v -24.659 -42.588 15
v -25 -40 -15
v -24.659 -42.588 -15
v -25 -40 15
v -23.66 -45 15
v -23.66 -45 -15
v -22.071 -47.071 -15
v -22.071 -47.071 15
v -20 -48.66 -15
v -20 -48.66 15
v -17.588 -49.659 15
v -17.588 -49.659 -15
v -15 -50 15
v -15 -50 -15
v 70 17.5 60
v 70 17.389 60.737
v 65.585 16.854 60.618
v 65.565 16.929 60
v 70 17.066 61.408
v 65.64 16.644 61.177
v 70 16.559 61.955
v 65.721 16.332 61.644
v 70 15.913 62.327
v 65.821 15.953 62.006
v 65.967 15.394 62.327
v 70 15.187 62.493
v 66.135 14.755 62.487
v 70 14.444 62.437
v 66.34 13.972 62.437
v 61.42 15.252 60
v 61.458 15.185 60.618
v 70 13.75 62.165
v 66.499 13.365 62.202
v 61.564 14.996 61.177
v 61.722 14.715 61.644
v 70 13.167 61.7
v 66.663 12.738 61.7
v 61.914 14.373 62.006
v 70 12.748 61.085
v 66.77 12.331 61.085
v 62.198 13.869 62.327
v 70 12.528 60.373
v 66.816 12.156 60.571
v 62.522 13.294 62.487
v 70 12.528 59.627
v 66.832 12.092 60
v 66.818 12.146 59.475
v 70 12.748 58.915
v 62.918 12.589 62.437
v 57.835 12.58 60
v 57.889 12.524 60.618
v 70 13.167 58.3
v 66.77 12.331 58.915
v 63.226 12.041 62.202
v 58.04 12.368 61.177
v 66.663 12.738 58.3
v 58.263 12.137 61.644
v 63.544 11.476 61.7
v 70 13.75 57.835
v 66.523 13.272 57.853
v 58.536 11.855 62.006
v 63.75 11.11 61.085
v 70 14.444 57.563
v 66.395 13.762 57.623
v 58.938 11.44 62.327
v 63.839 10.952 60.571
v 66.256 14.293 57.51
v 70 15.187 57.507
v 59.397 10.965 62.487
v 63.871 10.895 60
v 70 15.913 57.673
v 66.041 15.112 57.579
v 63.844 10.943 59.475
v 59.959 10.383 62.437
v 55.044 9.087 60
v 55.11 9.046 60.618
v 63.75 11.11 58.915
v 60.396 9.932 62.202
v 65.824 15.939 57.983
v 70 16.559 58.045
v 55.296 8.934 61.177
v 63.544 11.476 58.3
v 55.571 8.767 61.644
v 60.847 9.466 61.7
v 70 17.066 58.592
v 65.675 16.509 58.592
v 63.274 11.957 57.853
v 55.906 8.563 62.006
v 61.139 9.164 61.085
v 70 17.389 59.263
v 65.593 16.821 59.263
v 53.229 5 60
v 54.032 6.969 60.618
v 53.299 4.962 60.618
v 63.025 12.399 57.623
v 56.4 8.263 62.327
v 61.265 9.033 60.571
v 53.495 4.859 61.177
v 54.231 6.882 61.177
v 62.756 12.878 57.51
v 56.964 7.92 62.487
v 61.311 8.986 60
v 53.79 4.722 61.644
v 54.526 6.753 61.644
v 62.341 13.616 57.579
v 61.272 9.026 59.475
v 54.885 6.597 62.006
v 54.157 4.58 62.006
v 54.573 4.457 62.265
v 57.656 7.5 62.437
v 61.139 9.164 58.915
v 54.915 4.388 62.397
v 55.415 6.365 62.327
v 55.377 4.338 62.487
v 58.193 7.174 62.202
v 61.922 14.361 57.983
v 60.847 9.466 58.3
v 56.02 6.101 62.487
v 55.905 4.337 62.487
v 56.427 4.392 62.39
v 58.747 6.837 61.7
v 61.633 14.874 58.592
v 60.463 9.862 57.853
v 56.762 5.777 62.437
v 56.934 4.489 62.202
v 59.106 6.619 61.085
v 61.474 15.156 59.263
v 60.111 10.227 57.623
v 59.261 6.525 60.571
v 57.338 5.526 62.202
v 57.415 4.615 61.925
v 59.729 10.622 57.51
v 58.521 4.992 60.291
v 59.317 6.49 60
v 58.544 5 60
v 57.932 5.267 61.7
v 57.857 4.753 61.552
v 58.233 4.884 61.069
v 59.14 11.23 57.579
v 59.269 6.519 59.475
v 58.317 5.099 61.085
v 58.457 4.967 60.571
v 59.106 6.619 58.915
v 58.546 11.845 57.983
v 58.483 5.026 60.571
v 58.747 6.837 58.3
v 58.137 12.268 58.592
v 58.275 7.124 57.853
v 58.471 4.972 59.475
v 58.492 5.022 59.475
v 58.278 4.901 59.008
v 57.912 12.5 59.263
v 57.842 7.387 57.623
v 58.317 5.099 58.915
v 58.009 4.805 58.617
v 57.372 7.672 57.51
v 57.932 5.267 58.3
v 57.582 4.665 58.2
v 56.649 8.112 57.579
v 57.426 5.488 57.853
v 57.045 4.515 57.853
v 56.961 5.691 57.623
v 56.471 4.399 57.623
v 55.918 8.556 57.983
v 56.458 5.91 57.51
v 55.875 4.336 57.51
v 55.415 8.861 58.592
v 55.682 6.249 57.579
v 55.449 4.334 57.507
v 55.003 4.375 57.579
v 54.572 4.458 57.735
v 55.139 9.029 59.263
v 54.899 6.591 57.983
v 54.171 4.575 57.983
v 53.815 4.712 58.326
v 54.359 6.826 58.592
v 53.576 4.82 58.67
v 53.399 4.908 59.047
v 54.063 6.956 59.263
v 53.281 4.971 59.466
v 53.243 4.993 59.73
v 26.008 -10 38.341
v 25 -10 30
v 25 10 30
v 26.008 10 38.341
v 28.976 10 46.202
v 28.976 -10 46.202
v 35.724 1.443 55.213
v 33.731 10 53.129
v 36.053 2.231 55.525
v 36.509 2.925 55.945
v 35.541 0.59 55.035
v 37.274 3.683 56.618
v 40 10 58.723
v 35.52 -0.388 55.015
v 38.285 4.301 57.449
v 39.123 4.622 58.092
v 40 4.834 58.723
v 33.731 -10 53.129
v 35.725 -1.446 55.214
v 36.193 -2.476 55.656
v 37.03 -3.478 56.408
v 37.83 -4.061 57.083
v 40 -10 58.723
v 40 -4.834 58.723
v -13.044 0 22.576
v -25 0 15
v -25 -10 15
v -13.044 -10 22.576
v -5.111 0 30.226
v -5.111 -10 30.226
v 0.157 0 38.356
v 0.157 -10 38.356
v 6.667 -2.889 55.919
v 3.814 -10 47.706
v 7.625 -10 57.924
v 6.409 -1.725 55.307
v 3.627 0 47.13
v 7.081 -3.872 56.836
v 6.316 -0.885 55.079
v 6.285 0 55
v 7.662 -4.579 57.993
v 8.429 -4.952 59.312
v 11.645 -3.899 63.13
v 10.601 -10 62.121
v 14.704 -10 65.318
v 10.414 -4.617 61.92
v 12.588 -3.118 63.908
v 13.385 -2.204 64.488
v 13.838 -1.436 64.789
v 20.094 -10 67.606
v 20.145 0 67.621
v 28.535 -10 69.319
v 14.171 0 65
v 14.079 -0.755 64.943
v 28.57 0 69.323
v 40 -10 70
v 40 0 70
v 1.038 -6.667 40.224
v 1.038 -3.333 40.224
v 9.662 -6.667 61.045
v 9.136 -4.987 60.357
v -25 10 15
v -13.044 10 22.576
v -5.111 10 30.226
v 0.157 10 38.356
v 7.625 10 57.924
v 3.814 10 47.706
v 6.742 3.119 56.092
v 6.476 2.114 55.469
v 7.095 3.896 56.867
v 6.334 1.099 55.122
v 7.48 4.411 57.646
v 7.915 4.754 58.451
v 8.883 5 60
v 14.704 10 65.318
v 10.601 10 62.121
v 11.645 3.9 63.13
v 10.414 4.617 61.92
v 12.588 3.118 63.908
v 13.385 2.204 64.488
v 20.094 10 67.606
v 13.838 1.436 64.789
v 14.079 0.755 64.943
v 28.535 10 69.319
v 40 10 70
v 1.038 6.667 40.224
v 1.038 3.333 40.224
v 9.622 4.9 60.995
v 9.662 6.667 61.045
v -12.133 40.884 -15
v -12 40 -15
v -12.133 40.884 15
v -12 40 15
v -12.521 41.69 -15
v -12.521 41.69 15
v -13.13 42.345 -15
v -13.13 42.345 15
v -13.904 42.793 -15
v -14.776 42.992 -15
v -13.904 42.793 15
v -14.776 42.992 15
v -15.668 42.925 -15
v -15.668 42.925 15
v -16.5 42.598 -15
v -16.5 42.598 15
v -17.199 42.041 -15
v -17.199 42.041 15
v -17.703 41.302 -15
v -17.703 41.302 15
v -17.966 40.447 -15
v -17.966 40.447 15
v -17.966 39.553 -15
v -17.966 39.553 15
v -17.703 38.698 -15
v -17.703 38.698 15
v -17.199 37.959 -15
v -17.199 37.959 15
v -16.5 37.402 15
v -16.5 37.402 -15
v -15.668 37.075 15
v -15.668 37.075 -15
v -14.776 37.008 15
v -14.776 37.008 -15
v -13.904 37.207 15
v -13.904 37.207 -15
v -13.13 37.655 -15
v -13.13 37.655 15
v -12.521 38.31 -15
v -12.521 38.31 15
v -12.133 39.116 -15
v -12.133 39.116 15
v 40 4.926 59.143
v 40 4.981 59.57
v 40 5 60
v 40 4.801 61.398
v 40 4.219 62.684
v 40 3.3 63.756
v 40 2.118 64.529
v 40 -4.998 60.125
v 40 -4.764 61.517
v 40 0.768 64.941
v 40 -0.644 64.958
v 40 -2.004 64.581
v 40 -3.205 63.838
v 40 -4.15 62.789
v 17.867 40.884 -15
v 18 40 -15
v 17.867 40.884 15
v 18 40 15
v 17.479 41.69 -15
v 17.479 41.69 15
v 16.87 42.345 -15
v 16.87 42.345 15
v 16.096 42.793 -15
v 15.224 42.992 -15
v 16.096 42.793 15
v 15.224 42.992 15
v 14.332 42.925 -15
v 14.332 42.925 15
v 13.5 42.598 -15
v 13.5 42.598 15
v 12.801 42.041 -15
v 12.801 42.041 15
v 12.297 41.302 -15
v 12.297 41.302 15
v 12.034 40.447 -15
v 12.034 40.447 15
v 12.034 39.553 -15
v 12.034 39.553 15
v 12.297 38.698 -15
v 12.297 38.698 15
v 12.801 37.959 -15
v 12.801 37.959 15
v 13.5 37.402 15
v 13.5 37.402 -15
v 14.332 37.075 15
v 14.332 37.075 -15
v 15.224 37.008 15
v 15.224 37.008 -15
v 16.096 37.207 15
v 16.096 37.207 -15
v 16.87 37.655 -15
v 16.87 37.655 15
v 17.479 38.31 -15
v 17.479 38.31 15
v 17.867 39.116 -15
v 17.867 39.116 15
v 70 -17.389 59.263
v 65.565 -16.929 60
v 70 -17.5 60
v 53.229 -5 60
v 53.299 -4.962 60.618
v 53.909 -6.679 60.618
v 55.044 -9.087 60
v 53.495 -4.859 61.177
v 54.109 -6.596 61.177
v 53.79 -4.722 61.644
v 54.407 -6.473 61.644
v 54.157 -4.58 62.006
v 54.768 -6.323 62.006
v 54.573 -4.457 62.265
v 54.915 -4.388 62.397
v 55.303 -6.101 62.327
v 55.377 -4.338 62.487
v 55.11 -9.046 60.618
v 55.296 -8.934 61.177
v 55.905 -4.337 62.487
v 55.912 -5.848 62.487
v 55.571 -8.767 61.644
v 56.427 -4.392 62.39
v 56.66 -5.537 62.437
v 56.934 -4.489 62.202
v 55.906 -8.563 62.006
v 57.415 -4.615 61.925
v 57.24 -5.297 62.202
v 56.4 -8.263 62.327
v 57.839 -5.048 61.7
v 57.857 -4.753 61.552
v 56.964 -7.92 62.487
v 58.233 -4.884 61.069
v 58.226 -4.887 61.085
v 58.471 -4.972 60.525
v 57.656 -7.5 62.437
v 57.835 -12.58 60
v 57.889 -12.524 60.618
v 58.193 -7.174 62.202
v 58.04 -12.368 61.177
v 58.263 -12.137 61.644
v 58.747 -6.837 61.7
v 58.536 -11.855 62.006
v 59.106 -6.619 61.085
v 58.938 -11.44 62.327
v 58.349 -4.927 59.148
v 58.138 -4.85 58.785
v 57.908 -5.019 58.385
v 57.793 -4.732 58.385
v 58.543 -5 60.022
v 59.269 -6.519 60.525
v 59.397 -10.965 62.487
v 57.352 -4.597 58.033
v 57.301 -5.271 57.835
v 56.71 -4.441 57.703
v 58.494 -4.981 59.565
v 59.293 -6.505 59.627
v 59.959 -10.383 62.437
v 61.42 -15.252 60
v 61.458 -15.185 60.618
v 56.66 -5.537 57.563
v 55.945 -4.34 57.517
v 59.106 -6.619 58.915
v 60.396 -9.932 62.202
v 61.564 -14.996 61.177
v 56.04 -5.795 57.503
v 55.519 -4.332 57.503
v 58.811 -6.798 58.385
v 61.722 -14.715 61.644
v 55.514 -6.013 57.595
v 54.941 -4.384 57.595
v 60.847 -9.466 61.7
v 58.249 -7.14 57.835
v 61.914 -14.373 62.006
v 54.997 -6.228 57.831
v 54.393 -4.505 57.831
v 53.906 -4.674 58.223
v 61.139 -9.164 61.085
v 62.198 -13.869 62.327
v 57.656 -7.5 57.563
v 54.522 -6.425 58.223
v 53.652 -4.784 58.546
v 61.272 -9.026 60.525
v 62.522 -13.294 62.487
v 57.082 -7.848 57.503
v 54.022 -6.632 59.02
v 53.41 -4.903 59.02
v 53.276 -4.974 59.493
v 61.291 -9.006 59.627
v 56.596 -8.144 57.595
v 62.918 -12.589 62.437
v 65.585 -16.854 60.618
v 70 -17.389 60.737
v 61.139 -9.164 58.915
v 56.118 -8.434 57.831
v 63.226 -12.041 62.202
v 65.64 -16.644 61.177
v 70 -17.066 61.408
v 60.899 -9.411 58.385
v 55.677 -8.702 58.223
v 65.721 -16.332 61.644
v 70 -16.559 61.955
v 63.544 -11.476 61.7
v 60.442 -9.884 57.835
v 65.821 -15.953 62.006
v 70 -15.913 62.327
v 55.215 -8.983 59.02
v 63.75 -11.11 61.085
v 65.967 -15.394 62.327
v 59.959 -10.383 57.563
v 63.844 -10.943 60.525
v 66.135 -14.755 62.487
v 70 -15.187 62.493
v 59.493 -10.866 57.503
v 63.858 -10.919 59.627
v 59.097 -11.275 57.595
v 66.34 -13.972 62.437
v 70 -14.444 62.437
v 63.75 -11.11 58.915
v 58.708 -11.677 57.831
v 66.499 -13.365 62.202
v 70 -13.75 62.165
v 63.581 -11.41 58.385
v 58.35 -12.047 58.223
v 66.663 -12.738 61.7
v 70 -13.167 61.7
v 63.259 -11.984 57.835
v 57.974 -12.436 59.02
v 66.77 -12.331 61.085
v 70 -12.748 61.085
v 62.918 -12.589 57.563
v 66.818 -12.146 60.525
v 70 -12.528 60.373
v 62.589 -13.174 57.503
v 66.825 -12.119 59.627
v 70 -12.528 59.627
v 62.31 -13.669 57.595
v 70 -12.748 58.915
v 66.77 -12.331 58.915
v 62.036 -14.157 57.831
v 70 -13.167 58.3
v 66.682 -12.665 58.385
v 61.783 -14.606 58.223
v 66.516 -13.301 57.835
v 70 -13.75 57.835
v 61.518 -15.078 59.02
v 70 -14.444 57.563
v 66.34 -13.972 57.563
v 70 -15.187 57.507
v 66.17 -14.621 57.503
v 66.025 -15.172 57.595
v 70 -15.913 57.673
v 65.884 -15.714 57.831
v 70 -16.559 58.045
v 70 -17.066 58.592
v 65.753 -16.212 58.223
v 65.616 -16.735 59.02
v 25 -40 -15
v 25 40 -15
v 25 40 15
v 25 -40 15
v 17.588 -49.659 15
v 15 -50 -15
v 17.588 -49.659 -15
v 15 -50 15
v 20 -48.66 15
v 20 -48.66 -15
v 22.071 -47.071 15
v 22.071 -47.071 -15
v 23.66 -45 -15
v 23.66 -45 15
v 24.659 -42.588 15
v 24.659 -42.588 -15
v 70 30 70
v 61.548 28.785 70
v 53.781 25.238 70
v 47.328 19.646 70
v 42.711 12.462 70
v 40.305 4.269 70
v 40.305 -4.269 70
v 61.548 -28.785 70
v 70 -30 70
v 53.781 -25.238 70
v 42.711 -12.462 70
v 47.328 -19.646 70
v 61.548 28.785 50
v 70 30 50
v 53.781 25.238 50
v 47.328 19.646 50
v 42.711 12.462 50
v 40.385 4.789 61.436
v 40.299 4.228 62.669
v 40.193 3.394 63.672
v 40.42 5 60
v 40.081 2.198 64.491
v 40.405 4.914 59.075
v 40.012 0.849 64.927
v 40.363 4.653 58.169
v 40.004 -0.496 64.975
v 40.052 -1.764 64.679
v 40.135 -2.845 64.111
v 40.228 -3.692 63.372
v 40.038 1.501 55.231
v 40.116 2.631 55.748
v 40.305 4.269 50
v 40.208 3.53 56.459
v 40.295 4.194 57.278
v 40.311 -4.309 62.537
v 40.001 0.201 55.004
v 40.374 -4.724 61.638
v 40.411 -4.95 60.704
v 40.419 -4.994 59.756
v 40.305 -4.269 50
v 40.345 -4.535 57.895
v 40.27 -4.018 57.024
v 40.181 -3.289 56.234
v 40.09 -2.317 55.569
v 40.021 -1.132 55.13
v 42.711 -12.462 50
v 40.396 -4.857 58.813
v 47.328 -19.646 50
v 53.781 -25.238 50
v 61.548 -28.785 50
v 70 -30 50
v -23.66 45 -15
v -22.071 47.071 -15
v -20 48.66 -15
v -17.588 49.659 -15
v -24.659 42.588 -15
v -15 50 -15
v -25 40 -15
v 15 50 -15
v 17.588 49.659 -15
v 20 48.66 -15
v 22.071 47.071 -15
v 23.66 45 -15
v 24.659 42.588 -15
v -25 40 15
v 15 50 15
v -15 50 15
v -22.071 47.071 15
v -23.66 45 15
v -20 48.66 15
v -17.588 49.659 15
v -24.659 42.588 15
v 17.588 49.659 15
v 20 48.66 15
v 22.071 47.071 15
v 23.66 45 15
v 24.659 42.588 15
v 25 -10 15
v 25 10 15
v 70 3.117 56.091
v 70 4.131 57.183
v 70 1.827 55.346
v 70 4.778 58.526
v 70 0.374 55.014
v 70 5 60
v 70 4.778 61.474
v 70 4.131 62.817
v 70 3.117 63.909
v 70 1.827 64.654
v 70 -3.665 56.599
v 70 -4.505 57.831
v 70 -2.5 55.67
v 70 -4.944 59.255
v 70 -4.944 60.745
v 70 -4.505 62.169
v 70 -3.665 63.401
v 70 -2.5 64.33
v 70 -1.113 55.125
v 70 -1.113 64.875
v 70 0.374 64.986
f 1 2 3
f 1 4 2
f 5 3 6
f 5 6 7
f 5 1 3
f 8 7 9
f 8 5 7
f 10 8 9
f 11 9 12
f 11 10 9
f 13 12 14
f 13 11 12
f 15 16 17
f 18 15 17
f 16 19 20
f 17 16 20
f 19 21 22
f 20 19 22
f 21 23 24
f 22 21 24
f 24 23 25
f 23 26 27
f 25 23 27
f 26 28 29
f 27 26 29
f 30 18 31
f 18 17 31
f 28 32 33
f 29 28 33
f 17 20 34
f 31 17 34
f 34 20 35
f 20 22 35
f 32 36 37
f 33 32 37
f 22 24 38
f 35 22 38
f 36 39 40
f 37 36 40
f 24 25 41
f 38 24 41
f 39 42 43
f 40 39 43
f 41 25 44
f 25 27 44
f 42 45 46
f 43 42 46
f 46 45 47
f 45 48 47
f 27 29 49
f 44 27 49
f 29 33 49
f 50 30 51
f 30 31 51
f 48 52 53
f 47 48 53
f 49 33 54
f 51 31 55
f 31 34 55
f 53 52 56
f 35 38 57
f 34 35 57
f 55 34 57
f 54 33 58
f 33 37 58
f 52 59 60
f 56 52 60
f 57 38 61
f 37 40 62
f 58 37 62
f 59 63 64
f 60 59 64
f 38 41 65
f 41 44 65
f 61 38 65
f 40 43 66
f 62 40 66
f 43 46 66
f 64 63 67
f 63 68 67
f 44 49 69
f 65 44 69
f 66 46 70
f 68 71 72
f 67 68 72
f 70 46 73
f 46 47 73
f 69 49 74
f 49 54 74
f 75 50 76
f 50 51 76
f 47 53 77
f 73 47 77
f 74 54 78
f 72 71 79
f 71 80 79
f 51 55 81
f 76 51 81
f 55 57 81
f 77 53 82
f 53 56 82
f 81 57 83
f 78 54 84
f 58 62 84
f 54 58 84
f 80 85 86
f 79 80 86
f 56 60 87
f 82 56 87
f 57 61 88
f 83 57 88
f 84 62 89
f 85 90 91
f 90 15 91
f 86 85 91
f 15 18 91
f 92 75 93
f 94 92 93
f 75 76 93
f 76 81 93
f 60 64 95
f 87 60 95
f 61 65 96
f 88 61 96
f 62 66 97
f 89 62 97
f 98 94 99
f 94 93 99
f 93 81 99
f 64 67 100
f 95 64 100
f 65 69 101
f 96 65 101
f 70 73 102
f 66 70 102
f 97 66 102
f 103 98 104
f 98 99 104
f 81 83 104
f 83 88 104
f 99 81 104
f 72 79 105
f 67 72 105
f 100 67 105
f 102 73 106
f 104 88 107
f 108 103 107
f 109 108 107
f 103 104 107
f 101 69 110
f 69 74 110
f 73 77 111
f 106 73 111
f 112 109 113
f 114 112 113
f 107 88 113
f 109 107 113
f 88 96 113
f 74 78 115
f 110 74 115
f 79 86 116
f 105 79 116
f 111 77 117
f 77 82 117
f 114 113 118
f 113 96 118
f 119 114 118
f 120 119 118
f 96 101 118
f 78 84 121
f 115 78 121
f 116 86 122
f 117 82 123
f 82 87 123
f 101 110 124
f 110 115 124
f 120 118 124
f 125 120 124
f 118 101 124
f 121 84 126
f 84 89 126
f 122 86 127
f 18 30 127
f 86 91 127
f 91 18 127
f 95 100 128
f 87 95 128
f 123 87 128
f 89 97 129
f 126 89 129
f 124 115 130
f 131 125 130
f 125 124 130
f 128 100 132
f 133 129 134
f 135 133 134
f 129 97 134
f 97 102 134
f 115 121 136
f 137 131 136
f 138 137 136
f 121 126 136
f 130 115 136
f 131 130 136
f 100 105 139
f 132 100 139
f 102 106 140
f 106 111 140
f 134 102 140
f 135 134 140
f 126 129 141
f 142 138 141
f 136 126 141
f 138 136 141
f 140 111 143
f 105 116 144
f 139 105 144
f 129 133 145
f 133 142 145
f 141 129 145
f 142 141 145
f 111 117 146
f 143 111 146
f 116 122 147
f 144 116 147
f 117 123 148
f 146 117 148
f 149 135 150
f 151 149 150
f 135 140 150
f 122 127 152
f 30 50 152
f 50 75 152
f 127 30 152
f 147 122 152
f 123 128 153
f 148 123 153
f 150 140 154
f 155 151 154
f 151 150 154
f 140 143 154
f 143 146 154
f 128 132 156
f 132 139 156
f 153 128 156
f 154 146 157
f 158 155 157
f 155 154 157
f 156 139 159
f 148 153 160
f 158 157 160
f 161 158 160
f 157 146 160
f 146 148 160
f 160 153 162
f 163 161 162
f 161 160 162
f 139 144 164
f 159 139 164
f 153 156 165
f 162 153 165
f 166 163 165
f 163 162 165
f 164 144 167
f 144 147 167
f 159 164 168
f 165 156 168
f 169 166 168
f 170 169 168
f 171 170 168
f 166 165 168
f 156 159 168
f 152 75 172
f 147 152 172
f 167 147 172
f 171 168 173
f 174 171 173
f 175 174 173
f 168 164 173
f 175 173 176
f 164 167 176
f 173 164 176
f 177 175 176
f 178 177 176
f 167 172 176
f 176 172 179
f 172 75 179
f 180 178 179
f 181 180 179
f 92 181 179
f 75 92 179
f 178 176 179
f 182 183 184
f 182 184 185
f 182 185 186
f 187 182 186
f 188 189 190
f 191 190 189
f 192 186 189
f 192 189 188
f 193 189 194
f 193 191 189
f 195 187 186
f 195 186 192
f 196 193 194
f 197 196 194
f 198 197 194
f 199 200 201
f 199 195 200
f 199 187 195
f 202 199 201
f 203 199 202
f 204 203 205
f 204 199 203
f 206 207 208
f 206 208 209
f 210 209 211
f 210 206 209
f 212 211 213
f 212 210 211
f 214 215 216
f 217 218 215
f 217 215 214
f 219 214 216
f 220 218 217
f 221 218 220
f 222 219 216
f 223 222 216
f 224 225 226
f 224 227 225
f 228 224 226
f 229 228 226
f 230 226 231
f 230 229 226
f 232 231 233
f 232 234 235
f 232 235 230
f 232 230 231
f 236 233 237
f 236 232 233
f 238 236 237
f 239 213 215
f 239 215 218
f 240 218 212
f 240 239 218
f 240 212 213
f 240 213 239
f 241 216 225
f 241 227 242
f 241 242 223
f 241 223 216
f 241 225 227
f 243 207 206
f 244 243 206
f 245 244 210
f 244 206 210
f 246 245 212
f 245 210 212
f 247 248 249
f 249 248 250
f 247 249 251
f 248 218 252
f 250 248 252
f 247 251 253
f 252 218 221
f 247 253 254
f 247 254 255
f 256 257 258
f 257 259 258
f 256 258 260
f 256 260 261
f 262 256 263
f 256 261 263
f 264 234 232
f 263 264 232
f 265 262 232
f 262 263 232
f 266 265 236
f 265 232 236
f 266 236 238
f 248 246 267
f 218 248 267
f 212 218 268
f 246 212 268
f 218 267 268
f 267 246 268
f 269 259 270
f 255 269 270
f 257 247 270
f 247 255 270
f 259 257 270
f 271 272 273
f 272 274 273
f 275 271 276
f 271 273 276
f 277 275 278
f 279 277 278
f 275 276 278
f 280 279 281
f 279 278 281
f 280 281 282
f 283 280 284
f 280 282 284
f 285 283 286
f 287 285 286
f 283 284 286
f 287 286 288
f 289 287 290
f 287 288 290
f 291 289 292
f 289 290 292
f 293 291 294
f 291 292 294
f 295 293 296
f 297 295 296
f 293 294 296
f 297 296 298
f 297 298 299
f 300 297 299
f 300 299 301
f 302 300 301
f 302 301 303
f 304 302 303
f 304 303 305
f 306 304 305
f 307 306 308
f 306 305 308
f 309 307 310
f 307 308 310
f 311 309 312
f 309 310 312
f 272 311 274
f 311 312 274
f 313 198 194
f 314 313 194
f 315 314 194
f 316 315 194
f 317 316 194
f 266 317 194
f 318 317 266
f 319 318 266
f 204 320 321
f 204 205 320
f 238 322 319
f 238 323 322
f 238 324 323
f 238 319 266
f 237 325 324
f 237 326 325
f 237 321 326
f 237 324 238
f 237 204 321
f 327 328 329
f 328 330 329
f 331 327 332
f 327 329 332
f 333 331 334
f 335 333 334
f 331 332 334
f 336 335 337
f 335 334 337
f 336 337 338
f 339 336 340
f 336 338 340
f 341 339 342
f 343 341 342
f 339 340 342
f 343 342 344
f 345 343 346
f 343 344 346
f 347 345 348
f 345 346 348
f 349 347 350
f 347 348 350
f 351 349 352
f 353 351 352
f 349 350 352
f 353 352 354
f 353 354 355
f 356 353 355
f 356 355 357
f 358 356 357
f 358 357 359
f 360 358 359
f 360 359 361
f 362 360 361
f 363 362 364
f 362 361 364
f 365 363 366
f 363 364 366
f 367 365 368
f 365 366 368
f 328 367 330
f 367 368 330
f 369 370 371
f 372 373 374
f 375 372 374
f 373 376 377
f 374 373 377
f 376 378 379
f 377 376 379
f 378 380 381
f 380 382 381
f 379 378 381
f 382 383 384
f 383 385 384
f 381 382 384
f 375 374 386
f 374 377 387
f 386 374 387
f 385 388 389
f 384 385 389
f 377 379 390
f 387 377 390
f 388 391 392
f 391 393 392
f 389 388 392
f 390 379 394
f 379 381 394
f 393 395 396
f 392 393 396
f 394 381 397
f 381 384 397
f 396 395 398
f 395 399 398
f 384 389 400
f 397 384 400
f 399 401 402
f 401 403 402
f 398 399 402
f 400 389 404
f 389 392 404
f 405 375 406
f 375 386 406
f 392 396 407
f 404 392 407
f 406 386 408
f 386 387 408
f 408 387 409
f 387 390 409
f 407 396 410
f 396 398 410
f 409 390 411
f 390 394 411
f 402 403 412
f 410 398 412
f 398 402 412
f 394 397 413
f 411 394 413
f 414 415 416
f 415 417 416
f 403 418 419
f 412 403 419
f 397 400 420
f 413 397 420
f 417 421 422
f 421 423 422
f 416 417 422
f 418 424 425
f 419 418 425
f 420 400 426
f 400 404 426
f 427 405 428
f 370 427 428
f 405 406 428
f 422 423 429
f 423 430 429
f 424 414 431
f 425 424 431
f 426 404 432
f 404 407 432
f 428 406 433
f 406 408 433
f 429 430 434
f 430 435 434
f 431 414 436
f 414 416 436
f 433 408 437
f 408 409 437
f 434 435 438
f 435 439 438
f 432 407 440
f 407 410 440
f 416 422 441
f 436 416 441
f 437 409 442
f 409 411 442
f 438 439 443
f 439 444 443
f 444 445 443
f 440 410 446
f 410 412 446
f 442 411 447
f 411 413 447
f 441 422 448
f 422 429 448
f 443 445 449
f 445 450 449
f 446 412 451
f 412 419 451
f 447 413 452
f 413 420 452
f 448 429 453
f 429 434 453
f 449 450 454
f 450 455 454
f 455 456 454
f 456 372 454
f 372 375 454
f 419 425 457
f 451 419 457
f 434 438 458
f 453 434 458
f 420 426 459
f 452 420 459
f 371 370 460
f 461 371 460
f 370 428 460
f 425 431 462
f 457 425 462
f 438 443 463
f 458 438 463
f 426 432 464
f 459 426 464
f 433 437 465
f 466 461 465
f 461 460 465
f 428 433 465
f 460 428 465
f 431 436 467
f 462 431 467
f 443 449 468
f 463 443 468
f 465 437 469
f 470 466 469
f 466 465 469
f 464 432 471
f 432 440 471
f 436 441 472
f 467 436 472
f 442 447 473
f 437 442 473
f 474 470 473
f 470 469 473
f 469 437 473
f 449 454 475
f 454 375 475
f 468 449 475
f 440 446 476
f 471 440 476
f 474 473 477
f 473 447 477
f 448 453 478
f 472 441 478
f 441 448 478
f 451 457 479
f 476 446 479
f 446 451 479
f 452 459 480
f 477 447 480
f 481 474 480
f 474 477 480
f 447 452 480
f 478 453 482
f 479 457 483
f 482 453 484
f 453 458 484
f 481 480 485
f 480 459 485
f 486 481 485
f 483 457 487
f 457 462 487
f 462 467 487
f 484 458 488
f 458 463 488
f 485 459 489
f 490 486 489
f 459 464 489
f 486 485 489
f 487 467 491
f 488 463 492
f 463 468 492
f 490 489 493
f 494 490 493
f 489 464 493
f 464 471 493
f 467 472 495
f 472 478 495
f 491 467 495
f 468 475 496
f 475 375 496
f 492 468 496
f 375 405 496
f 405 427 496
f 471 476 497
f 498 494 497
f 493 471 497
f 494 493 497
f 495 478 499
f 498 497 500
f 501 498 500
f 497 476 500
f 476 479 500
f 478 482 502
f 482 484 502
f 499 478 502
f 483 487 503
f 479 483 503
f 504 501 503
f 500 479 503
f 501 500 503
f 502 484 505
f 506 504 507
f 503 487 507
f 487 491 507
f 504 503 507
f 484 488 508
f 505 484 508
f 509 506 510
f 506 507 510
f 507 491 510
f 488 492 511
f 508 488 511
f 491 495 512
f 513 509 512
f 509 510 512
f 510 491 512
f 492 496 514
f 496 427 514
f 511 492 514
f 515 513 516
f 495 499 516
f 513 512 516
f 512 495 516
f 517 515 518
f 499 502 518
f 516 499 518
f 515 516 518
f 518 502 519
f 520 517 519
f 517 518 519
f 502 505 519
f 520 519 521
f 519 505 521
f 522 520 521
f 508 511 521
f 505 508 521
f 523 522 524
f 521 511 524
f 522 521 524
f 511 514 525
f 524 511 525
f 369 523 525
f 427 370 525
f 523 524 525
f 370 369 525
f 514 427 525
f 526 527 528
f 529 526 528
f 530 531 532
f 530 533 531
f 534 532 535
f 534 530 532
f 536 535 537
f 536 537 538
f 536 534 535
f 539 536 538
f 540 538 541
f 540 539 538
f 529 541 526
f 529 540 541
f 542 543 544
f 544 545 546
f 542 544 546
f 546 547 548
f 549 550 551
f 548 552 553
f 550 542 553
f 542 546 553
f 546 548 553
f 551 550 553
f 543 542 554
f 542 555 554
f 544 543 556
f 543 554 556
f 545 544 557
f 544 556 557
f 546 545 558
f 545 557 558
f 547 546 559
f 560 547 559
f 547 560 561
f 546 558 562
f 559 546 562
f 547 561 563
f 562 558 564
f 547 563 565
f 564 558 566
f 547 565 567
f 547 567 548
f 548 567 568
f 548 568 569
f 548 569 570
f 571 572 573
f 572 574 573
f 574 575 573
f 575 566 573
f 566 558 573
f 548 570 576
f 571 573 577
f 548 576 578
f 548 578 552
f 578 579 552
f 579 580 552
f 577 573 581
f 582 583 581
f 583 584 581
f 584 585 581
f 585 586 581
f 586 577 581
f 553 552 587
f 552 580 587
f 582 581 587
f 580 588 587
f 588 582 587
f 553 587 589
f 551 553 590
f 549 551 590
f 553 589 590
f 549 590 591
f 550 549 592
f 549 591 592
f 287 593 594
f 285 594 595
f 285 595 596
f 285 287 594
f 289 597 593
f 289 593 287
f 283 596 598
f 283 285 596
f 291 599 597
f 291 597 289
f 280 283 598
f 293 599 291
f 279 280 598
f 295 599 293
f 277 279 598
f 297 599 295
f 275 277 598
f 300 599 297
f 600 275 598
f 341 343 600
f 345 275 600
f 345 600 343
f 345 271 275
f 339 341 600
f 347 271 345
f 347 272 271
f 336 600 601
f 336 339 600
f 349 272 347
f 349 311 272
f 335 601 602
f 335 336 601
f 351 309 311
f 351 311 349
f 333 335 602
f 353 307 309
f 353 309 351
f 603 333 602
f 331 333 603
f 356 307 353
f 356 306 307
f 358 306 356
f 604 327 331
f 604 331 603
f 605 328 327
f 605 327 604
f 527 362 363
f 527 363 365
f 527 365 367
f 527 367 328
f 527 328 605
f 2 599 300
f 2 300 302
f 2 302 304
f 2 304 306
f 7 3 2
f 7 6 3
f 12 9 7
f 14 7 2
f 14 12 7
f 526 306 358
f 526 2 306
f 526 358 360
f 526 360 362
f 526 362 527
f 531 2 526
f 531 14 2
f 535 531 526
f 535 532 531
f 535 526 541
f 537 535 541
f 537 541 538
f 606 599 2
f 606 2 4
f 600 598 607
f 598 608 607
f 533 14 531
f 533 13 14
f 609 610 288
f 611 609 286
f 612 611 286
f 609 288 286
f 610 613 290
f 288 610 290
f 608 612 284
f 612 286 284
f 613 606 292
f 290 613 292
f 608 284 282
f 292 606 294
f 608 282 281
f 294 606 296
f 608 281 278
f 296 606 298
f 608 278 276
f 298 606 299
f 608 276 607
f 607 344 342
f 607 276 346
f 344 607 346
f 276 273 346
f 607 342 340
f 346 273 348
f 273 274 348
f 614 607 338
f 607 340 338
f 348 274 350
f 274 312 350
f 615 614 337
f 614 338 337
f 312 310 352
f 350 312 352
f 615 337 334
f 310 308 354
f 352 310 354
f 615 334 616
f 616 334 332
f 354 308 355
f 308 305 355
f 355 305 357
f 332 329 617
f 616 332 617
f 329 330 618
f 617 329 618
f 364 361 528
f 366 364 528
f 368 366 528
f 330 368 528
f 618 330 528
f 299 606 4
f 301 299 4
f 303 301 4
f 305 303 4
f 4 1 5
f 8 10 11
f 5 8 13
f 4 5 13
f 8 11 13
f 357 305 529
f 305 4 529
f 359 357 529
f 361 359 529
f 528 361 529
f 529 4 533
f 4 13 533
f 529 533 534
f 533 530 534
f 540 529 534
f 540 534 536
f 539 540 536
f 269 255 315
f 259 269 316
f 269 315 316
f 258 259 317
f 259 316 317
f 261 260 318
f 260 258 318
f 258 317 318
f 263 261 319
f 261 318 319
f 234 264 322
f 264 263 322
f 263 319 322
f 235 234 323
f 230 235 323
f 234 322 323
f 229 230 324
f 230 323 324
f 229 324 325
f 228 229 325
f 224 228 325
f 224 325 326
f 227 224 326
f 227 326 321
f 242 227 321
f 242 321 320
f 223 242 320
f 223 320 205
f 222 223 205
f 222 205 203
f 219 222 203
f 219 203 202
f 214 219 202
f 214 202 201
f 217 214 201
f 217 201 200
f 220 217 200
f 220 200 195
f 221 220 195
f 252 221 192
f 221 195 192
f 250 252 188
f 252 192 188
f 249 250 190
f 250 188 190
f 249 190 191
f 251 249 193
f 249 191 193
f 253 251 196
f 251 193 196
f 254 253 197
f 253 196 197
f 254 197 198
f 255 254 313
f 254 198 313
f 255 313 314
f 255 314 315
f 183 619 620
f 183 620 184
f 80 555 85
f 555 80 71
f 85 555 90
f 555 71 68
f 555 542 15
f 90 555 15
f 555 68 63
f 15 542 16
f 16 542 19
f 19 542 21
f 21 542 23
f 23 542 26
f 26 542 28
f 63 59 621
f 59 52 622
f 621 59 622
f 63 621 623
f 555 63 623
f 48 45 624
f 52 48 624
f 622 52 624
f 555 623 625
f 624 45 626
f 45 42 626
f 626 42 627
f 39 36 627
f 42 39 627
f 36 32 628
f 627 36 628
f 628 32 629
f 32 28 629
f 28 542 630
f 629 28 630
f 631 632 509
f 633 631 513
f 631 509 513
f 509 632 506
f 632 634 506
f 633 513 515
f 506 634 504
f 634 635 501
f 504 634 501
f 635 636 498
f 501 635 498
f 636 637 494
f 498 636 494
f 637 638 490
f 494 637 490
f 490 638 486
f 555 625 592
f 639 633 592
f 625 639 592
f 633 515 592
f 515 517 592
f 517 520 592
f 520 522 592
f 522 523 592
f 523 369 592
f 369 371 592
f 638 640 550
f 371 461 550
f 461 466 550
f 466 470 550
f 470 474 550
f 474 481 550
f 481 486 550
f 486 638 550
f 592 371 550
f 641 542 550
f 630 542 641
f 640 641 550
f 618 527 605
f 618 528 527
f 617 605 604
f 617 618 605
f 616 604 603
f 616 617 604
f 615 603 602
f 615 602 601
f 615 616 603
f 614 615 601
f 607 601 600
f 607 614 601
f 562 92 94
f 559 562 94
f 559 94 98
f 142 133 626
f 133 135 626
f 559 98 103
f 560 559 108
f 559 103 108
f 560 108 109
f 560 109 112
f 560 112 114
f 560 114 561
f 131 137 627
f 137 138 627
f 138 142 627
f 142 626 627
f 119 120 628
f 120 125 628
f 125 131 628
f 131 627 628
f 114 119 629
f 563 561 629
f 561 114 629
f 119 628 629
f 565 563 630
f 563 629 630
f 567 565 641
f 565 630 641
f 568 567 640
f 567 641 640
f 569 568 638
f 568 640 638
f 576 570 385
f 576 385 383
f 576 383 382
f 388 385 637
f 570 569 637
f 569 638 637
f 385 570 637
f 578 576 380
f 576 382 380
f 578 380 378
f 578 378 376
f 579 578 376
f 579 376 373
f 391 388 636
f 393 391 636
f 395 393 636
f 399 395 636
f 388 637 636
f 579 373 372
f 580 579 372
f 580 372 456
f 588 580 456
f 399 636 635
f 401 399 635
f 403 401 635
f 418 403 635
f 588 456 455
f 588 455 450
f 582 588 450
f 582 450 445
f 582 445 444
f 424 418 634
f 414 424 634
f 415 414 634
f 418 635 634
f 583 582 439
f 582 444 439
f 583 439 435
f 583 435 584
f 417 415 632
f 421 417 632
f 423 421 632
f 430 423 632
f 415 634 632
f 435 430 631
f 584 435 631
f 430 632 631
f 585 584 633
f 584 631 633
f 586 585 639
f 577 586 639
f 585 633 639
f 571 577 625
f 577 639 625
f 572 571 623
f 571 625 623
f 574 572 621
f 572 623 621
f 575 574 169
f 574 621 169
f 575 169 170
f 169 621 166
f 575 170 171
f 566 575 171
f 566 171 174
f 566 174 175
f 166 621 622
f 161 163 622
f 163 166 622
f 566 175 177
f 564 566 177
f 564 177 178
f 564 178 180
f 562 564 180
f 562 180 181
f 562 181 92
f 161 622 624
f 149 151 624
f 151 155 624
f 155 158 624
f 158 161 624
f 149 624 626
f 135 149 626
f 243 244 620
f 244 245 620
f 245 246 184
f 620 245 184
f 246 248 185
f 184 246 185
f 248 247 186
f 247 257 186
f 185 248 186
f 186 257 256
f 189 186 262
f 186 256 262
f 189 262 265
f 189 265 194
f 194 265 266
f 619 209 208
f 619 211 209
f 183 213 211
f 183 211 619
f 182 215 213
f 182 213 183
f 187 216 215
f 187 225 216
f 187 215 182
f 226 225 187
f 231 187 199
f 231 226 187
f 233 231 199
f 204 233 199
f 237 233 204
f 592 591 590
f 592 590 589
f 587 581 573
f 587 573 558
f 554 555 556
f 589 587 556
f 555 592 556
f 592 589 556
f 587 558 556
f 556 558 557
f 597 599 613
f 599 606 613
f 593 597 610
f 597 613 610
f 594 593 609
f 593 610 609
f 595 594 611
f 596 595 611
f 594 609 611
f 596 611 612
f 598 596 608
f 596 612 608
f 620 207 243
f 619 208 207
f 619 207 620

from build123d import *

# Parameters (mm, degrees)
F0_W          = 50
F0_H          = 30
F1_DEPTH      = 50
F2_DEPTH      = 10
F3_ANGLE_BACK = 90
F3_ANGLE      = 180
F4_R          = 10
F5_R          = 3
F6_DEPTH      = 17.5
F7_DEPTH      = 15
F8_R          = 5
F9_DEPTH      = 100


with BuildPart() as f1:
    # F0 (on Front) → F1 (new body, symmetric)
    with BuildSketch(Plane.XZ):
        Rectangle(F0_W, F0_H)
    extrude(amount=F1_DEPTH, both=True)

    # F4
    f4_edges = [f1.edges().sort_by_distance(p)[0] for p in [
        (-25, -50, 0),
        (25, -50, 0),
        (25, 50, 0),
        (-25, 50, 0),
    ]]
    fillet(f4_edges, radius=F4_R)

    # F5 (on Top) → F6 (cut, symmetric)
    with BuildSketch(Plane.XY):
        with Locations((-15, 40)):
            Circle(F5_R)
    extrude(amount=F6_DEPTH, both=True, mode=Mode.SUBTRACT)

    # F5 (on Top) → F7 (cut, symmetric)
    with BuildSketch(Plane.XY):
        with Locations((15, 40)):
            Circle(F5_R)
    extrude(amount=F7_DEPTH, both=True, mode=Mode.SUBTRACT)


with BuildPart() as f2:
    # F0 (on Front) → F2 (new body, symmetric)
    with BuildSketch(Plane.XZ):
        with BuildLine():
            Line((-25, 15), (25, 15))
            Line((25, 15), (25, 30))
            ThreePointArc((25, 30), (28.975815885, 46.201851746), (40, 58.7228132327))
            Line((40, 58.7228132327), (40, 70))
            add(Edge.make_bspline(
                [(-25, 15), (22.7879397571, 39.9372093379), (-14.2387868837, 69.4658607244), (40, 70)],
                knots=[0, 0, 0, 0, 85.1469318296, 85.1469318296, 85.1469318296, 85.1469318296], degree=3))
        make_face()
    extrude(amount=F2_DEPTH, both=True)


with BuildPart() as f3:
    # F0 (on Front) → F3 (revolve)
    with BuildSketch(Plane.XZ, mode=Mode.PRIVATE) as f3_sk:
        Polygon((70, 70), (40, 70), (40, 58.7228132327), (40, 50), (70, 50), align=None)
        with BuildLine():
            ThreePointArc((57.5, 60), (55, 57.5), (52.5, 60))
            ThreePointArc((52.5, 60), (55, 62.5), (57.5, 60))
        make_face(mode=Mode.SUBTRACT)
    revolve(f3_sk.sketch.rotate(Axis((70, 0, 60), (0, 0, 1)), -F3_ANGLE_BACK), axis=Axis((70, 0, 60), (0, 0, 1)), revolution_arc=F3_ANGLE)


with BuildPart() as f9_tool:
    # F8 (on Right) → F9 (new body, symmetric)
    with BuildSketch(Plane.YZ):
        with Locations((0, 60)):
            Circle(F8_R)
    extrude(amount=F9_DEPTH, both=True)


with BuildPart() as f2_1:
    add(f2.part)

    # F9: cut by f9_tool
    add(f9_tool.part, mode=Mode.SUBTRACT)


with BuildPart() as f3_1:
    add(f3.part)

    # F9: cut by f9_tool
    add(f9_tool.part, mode=Mode.SUBTRACT)


solid = Compound([f1.part, f2_1.part, f3_1.part])
